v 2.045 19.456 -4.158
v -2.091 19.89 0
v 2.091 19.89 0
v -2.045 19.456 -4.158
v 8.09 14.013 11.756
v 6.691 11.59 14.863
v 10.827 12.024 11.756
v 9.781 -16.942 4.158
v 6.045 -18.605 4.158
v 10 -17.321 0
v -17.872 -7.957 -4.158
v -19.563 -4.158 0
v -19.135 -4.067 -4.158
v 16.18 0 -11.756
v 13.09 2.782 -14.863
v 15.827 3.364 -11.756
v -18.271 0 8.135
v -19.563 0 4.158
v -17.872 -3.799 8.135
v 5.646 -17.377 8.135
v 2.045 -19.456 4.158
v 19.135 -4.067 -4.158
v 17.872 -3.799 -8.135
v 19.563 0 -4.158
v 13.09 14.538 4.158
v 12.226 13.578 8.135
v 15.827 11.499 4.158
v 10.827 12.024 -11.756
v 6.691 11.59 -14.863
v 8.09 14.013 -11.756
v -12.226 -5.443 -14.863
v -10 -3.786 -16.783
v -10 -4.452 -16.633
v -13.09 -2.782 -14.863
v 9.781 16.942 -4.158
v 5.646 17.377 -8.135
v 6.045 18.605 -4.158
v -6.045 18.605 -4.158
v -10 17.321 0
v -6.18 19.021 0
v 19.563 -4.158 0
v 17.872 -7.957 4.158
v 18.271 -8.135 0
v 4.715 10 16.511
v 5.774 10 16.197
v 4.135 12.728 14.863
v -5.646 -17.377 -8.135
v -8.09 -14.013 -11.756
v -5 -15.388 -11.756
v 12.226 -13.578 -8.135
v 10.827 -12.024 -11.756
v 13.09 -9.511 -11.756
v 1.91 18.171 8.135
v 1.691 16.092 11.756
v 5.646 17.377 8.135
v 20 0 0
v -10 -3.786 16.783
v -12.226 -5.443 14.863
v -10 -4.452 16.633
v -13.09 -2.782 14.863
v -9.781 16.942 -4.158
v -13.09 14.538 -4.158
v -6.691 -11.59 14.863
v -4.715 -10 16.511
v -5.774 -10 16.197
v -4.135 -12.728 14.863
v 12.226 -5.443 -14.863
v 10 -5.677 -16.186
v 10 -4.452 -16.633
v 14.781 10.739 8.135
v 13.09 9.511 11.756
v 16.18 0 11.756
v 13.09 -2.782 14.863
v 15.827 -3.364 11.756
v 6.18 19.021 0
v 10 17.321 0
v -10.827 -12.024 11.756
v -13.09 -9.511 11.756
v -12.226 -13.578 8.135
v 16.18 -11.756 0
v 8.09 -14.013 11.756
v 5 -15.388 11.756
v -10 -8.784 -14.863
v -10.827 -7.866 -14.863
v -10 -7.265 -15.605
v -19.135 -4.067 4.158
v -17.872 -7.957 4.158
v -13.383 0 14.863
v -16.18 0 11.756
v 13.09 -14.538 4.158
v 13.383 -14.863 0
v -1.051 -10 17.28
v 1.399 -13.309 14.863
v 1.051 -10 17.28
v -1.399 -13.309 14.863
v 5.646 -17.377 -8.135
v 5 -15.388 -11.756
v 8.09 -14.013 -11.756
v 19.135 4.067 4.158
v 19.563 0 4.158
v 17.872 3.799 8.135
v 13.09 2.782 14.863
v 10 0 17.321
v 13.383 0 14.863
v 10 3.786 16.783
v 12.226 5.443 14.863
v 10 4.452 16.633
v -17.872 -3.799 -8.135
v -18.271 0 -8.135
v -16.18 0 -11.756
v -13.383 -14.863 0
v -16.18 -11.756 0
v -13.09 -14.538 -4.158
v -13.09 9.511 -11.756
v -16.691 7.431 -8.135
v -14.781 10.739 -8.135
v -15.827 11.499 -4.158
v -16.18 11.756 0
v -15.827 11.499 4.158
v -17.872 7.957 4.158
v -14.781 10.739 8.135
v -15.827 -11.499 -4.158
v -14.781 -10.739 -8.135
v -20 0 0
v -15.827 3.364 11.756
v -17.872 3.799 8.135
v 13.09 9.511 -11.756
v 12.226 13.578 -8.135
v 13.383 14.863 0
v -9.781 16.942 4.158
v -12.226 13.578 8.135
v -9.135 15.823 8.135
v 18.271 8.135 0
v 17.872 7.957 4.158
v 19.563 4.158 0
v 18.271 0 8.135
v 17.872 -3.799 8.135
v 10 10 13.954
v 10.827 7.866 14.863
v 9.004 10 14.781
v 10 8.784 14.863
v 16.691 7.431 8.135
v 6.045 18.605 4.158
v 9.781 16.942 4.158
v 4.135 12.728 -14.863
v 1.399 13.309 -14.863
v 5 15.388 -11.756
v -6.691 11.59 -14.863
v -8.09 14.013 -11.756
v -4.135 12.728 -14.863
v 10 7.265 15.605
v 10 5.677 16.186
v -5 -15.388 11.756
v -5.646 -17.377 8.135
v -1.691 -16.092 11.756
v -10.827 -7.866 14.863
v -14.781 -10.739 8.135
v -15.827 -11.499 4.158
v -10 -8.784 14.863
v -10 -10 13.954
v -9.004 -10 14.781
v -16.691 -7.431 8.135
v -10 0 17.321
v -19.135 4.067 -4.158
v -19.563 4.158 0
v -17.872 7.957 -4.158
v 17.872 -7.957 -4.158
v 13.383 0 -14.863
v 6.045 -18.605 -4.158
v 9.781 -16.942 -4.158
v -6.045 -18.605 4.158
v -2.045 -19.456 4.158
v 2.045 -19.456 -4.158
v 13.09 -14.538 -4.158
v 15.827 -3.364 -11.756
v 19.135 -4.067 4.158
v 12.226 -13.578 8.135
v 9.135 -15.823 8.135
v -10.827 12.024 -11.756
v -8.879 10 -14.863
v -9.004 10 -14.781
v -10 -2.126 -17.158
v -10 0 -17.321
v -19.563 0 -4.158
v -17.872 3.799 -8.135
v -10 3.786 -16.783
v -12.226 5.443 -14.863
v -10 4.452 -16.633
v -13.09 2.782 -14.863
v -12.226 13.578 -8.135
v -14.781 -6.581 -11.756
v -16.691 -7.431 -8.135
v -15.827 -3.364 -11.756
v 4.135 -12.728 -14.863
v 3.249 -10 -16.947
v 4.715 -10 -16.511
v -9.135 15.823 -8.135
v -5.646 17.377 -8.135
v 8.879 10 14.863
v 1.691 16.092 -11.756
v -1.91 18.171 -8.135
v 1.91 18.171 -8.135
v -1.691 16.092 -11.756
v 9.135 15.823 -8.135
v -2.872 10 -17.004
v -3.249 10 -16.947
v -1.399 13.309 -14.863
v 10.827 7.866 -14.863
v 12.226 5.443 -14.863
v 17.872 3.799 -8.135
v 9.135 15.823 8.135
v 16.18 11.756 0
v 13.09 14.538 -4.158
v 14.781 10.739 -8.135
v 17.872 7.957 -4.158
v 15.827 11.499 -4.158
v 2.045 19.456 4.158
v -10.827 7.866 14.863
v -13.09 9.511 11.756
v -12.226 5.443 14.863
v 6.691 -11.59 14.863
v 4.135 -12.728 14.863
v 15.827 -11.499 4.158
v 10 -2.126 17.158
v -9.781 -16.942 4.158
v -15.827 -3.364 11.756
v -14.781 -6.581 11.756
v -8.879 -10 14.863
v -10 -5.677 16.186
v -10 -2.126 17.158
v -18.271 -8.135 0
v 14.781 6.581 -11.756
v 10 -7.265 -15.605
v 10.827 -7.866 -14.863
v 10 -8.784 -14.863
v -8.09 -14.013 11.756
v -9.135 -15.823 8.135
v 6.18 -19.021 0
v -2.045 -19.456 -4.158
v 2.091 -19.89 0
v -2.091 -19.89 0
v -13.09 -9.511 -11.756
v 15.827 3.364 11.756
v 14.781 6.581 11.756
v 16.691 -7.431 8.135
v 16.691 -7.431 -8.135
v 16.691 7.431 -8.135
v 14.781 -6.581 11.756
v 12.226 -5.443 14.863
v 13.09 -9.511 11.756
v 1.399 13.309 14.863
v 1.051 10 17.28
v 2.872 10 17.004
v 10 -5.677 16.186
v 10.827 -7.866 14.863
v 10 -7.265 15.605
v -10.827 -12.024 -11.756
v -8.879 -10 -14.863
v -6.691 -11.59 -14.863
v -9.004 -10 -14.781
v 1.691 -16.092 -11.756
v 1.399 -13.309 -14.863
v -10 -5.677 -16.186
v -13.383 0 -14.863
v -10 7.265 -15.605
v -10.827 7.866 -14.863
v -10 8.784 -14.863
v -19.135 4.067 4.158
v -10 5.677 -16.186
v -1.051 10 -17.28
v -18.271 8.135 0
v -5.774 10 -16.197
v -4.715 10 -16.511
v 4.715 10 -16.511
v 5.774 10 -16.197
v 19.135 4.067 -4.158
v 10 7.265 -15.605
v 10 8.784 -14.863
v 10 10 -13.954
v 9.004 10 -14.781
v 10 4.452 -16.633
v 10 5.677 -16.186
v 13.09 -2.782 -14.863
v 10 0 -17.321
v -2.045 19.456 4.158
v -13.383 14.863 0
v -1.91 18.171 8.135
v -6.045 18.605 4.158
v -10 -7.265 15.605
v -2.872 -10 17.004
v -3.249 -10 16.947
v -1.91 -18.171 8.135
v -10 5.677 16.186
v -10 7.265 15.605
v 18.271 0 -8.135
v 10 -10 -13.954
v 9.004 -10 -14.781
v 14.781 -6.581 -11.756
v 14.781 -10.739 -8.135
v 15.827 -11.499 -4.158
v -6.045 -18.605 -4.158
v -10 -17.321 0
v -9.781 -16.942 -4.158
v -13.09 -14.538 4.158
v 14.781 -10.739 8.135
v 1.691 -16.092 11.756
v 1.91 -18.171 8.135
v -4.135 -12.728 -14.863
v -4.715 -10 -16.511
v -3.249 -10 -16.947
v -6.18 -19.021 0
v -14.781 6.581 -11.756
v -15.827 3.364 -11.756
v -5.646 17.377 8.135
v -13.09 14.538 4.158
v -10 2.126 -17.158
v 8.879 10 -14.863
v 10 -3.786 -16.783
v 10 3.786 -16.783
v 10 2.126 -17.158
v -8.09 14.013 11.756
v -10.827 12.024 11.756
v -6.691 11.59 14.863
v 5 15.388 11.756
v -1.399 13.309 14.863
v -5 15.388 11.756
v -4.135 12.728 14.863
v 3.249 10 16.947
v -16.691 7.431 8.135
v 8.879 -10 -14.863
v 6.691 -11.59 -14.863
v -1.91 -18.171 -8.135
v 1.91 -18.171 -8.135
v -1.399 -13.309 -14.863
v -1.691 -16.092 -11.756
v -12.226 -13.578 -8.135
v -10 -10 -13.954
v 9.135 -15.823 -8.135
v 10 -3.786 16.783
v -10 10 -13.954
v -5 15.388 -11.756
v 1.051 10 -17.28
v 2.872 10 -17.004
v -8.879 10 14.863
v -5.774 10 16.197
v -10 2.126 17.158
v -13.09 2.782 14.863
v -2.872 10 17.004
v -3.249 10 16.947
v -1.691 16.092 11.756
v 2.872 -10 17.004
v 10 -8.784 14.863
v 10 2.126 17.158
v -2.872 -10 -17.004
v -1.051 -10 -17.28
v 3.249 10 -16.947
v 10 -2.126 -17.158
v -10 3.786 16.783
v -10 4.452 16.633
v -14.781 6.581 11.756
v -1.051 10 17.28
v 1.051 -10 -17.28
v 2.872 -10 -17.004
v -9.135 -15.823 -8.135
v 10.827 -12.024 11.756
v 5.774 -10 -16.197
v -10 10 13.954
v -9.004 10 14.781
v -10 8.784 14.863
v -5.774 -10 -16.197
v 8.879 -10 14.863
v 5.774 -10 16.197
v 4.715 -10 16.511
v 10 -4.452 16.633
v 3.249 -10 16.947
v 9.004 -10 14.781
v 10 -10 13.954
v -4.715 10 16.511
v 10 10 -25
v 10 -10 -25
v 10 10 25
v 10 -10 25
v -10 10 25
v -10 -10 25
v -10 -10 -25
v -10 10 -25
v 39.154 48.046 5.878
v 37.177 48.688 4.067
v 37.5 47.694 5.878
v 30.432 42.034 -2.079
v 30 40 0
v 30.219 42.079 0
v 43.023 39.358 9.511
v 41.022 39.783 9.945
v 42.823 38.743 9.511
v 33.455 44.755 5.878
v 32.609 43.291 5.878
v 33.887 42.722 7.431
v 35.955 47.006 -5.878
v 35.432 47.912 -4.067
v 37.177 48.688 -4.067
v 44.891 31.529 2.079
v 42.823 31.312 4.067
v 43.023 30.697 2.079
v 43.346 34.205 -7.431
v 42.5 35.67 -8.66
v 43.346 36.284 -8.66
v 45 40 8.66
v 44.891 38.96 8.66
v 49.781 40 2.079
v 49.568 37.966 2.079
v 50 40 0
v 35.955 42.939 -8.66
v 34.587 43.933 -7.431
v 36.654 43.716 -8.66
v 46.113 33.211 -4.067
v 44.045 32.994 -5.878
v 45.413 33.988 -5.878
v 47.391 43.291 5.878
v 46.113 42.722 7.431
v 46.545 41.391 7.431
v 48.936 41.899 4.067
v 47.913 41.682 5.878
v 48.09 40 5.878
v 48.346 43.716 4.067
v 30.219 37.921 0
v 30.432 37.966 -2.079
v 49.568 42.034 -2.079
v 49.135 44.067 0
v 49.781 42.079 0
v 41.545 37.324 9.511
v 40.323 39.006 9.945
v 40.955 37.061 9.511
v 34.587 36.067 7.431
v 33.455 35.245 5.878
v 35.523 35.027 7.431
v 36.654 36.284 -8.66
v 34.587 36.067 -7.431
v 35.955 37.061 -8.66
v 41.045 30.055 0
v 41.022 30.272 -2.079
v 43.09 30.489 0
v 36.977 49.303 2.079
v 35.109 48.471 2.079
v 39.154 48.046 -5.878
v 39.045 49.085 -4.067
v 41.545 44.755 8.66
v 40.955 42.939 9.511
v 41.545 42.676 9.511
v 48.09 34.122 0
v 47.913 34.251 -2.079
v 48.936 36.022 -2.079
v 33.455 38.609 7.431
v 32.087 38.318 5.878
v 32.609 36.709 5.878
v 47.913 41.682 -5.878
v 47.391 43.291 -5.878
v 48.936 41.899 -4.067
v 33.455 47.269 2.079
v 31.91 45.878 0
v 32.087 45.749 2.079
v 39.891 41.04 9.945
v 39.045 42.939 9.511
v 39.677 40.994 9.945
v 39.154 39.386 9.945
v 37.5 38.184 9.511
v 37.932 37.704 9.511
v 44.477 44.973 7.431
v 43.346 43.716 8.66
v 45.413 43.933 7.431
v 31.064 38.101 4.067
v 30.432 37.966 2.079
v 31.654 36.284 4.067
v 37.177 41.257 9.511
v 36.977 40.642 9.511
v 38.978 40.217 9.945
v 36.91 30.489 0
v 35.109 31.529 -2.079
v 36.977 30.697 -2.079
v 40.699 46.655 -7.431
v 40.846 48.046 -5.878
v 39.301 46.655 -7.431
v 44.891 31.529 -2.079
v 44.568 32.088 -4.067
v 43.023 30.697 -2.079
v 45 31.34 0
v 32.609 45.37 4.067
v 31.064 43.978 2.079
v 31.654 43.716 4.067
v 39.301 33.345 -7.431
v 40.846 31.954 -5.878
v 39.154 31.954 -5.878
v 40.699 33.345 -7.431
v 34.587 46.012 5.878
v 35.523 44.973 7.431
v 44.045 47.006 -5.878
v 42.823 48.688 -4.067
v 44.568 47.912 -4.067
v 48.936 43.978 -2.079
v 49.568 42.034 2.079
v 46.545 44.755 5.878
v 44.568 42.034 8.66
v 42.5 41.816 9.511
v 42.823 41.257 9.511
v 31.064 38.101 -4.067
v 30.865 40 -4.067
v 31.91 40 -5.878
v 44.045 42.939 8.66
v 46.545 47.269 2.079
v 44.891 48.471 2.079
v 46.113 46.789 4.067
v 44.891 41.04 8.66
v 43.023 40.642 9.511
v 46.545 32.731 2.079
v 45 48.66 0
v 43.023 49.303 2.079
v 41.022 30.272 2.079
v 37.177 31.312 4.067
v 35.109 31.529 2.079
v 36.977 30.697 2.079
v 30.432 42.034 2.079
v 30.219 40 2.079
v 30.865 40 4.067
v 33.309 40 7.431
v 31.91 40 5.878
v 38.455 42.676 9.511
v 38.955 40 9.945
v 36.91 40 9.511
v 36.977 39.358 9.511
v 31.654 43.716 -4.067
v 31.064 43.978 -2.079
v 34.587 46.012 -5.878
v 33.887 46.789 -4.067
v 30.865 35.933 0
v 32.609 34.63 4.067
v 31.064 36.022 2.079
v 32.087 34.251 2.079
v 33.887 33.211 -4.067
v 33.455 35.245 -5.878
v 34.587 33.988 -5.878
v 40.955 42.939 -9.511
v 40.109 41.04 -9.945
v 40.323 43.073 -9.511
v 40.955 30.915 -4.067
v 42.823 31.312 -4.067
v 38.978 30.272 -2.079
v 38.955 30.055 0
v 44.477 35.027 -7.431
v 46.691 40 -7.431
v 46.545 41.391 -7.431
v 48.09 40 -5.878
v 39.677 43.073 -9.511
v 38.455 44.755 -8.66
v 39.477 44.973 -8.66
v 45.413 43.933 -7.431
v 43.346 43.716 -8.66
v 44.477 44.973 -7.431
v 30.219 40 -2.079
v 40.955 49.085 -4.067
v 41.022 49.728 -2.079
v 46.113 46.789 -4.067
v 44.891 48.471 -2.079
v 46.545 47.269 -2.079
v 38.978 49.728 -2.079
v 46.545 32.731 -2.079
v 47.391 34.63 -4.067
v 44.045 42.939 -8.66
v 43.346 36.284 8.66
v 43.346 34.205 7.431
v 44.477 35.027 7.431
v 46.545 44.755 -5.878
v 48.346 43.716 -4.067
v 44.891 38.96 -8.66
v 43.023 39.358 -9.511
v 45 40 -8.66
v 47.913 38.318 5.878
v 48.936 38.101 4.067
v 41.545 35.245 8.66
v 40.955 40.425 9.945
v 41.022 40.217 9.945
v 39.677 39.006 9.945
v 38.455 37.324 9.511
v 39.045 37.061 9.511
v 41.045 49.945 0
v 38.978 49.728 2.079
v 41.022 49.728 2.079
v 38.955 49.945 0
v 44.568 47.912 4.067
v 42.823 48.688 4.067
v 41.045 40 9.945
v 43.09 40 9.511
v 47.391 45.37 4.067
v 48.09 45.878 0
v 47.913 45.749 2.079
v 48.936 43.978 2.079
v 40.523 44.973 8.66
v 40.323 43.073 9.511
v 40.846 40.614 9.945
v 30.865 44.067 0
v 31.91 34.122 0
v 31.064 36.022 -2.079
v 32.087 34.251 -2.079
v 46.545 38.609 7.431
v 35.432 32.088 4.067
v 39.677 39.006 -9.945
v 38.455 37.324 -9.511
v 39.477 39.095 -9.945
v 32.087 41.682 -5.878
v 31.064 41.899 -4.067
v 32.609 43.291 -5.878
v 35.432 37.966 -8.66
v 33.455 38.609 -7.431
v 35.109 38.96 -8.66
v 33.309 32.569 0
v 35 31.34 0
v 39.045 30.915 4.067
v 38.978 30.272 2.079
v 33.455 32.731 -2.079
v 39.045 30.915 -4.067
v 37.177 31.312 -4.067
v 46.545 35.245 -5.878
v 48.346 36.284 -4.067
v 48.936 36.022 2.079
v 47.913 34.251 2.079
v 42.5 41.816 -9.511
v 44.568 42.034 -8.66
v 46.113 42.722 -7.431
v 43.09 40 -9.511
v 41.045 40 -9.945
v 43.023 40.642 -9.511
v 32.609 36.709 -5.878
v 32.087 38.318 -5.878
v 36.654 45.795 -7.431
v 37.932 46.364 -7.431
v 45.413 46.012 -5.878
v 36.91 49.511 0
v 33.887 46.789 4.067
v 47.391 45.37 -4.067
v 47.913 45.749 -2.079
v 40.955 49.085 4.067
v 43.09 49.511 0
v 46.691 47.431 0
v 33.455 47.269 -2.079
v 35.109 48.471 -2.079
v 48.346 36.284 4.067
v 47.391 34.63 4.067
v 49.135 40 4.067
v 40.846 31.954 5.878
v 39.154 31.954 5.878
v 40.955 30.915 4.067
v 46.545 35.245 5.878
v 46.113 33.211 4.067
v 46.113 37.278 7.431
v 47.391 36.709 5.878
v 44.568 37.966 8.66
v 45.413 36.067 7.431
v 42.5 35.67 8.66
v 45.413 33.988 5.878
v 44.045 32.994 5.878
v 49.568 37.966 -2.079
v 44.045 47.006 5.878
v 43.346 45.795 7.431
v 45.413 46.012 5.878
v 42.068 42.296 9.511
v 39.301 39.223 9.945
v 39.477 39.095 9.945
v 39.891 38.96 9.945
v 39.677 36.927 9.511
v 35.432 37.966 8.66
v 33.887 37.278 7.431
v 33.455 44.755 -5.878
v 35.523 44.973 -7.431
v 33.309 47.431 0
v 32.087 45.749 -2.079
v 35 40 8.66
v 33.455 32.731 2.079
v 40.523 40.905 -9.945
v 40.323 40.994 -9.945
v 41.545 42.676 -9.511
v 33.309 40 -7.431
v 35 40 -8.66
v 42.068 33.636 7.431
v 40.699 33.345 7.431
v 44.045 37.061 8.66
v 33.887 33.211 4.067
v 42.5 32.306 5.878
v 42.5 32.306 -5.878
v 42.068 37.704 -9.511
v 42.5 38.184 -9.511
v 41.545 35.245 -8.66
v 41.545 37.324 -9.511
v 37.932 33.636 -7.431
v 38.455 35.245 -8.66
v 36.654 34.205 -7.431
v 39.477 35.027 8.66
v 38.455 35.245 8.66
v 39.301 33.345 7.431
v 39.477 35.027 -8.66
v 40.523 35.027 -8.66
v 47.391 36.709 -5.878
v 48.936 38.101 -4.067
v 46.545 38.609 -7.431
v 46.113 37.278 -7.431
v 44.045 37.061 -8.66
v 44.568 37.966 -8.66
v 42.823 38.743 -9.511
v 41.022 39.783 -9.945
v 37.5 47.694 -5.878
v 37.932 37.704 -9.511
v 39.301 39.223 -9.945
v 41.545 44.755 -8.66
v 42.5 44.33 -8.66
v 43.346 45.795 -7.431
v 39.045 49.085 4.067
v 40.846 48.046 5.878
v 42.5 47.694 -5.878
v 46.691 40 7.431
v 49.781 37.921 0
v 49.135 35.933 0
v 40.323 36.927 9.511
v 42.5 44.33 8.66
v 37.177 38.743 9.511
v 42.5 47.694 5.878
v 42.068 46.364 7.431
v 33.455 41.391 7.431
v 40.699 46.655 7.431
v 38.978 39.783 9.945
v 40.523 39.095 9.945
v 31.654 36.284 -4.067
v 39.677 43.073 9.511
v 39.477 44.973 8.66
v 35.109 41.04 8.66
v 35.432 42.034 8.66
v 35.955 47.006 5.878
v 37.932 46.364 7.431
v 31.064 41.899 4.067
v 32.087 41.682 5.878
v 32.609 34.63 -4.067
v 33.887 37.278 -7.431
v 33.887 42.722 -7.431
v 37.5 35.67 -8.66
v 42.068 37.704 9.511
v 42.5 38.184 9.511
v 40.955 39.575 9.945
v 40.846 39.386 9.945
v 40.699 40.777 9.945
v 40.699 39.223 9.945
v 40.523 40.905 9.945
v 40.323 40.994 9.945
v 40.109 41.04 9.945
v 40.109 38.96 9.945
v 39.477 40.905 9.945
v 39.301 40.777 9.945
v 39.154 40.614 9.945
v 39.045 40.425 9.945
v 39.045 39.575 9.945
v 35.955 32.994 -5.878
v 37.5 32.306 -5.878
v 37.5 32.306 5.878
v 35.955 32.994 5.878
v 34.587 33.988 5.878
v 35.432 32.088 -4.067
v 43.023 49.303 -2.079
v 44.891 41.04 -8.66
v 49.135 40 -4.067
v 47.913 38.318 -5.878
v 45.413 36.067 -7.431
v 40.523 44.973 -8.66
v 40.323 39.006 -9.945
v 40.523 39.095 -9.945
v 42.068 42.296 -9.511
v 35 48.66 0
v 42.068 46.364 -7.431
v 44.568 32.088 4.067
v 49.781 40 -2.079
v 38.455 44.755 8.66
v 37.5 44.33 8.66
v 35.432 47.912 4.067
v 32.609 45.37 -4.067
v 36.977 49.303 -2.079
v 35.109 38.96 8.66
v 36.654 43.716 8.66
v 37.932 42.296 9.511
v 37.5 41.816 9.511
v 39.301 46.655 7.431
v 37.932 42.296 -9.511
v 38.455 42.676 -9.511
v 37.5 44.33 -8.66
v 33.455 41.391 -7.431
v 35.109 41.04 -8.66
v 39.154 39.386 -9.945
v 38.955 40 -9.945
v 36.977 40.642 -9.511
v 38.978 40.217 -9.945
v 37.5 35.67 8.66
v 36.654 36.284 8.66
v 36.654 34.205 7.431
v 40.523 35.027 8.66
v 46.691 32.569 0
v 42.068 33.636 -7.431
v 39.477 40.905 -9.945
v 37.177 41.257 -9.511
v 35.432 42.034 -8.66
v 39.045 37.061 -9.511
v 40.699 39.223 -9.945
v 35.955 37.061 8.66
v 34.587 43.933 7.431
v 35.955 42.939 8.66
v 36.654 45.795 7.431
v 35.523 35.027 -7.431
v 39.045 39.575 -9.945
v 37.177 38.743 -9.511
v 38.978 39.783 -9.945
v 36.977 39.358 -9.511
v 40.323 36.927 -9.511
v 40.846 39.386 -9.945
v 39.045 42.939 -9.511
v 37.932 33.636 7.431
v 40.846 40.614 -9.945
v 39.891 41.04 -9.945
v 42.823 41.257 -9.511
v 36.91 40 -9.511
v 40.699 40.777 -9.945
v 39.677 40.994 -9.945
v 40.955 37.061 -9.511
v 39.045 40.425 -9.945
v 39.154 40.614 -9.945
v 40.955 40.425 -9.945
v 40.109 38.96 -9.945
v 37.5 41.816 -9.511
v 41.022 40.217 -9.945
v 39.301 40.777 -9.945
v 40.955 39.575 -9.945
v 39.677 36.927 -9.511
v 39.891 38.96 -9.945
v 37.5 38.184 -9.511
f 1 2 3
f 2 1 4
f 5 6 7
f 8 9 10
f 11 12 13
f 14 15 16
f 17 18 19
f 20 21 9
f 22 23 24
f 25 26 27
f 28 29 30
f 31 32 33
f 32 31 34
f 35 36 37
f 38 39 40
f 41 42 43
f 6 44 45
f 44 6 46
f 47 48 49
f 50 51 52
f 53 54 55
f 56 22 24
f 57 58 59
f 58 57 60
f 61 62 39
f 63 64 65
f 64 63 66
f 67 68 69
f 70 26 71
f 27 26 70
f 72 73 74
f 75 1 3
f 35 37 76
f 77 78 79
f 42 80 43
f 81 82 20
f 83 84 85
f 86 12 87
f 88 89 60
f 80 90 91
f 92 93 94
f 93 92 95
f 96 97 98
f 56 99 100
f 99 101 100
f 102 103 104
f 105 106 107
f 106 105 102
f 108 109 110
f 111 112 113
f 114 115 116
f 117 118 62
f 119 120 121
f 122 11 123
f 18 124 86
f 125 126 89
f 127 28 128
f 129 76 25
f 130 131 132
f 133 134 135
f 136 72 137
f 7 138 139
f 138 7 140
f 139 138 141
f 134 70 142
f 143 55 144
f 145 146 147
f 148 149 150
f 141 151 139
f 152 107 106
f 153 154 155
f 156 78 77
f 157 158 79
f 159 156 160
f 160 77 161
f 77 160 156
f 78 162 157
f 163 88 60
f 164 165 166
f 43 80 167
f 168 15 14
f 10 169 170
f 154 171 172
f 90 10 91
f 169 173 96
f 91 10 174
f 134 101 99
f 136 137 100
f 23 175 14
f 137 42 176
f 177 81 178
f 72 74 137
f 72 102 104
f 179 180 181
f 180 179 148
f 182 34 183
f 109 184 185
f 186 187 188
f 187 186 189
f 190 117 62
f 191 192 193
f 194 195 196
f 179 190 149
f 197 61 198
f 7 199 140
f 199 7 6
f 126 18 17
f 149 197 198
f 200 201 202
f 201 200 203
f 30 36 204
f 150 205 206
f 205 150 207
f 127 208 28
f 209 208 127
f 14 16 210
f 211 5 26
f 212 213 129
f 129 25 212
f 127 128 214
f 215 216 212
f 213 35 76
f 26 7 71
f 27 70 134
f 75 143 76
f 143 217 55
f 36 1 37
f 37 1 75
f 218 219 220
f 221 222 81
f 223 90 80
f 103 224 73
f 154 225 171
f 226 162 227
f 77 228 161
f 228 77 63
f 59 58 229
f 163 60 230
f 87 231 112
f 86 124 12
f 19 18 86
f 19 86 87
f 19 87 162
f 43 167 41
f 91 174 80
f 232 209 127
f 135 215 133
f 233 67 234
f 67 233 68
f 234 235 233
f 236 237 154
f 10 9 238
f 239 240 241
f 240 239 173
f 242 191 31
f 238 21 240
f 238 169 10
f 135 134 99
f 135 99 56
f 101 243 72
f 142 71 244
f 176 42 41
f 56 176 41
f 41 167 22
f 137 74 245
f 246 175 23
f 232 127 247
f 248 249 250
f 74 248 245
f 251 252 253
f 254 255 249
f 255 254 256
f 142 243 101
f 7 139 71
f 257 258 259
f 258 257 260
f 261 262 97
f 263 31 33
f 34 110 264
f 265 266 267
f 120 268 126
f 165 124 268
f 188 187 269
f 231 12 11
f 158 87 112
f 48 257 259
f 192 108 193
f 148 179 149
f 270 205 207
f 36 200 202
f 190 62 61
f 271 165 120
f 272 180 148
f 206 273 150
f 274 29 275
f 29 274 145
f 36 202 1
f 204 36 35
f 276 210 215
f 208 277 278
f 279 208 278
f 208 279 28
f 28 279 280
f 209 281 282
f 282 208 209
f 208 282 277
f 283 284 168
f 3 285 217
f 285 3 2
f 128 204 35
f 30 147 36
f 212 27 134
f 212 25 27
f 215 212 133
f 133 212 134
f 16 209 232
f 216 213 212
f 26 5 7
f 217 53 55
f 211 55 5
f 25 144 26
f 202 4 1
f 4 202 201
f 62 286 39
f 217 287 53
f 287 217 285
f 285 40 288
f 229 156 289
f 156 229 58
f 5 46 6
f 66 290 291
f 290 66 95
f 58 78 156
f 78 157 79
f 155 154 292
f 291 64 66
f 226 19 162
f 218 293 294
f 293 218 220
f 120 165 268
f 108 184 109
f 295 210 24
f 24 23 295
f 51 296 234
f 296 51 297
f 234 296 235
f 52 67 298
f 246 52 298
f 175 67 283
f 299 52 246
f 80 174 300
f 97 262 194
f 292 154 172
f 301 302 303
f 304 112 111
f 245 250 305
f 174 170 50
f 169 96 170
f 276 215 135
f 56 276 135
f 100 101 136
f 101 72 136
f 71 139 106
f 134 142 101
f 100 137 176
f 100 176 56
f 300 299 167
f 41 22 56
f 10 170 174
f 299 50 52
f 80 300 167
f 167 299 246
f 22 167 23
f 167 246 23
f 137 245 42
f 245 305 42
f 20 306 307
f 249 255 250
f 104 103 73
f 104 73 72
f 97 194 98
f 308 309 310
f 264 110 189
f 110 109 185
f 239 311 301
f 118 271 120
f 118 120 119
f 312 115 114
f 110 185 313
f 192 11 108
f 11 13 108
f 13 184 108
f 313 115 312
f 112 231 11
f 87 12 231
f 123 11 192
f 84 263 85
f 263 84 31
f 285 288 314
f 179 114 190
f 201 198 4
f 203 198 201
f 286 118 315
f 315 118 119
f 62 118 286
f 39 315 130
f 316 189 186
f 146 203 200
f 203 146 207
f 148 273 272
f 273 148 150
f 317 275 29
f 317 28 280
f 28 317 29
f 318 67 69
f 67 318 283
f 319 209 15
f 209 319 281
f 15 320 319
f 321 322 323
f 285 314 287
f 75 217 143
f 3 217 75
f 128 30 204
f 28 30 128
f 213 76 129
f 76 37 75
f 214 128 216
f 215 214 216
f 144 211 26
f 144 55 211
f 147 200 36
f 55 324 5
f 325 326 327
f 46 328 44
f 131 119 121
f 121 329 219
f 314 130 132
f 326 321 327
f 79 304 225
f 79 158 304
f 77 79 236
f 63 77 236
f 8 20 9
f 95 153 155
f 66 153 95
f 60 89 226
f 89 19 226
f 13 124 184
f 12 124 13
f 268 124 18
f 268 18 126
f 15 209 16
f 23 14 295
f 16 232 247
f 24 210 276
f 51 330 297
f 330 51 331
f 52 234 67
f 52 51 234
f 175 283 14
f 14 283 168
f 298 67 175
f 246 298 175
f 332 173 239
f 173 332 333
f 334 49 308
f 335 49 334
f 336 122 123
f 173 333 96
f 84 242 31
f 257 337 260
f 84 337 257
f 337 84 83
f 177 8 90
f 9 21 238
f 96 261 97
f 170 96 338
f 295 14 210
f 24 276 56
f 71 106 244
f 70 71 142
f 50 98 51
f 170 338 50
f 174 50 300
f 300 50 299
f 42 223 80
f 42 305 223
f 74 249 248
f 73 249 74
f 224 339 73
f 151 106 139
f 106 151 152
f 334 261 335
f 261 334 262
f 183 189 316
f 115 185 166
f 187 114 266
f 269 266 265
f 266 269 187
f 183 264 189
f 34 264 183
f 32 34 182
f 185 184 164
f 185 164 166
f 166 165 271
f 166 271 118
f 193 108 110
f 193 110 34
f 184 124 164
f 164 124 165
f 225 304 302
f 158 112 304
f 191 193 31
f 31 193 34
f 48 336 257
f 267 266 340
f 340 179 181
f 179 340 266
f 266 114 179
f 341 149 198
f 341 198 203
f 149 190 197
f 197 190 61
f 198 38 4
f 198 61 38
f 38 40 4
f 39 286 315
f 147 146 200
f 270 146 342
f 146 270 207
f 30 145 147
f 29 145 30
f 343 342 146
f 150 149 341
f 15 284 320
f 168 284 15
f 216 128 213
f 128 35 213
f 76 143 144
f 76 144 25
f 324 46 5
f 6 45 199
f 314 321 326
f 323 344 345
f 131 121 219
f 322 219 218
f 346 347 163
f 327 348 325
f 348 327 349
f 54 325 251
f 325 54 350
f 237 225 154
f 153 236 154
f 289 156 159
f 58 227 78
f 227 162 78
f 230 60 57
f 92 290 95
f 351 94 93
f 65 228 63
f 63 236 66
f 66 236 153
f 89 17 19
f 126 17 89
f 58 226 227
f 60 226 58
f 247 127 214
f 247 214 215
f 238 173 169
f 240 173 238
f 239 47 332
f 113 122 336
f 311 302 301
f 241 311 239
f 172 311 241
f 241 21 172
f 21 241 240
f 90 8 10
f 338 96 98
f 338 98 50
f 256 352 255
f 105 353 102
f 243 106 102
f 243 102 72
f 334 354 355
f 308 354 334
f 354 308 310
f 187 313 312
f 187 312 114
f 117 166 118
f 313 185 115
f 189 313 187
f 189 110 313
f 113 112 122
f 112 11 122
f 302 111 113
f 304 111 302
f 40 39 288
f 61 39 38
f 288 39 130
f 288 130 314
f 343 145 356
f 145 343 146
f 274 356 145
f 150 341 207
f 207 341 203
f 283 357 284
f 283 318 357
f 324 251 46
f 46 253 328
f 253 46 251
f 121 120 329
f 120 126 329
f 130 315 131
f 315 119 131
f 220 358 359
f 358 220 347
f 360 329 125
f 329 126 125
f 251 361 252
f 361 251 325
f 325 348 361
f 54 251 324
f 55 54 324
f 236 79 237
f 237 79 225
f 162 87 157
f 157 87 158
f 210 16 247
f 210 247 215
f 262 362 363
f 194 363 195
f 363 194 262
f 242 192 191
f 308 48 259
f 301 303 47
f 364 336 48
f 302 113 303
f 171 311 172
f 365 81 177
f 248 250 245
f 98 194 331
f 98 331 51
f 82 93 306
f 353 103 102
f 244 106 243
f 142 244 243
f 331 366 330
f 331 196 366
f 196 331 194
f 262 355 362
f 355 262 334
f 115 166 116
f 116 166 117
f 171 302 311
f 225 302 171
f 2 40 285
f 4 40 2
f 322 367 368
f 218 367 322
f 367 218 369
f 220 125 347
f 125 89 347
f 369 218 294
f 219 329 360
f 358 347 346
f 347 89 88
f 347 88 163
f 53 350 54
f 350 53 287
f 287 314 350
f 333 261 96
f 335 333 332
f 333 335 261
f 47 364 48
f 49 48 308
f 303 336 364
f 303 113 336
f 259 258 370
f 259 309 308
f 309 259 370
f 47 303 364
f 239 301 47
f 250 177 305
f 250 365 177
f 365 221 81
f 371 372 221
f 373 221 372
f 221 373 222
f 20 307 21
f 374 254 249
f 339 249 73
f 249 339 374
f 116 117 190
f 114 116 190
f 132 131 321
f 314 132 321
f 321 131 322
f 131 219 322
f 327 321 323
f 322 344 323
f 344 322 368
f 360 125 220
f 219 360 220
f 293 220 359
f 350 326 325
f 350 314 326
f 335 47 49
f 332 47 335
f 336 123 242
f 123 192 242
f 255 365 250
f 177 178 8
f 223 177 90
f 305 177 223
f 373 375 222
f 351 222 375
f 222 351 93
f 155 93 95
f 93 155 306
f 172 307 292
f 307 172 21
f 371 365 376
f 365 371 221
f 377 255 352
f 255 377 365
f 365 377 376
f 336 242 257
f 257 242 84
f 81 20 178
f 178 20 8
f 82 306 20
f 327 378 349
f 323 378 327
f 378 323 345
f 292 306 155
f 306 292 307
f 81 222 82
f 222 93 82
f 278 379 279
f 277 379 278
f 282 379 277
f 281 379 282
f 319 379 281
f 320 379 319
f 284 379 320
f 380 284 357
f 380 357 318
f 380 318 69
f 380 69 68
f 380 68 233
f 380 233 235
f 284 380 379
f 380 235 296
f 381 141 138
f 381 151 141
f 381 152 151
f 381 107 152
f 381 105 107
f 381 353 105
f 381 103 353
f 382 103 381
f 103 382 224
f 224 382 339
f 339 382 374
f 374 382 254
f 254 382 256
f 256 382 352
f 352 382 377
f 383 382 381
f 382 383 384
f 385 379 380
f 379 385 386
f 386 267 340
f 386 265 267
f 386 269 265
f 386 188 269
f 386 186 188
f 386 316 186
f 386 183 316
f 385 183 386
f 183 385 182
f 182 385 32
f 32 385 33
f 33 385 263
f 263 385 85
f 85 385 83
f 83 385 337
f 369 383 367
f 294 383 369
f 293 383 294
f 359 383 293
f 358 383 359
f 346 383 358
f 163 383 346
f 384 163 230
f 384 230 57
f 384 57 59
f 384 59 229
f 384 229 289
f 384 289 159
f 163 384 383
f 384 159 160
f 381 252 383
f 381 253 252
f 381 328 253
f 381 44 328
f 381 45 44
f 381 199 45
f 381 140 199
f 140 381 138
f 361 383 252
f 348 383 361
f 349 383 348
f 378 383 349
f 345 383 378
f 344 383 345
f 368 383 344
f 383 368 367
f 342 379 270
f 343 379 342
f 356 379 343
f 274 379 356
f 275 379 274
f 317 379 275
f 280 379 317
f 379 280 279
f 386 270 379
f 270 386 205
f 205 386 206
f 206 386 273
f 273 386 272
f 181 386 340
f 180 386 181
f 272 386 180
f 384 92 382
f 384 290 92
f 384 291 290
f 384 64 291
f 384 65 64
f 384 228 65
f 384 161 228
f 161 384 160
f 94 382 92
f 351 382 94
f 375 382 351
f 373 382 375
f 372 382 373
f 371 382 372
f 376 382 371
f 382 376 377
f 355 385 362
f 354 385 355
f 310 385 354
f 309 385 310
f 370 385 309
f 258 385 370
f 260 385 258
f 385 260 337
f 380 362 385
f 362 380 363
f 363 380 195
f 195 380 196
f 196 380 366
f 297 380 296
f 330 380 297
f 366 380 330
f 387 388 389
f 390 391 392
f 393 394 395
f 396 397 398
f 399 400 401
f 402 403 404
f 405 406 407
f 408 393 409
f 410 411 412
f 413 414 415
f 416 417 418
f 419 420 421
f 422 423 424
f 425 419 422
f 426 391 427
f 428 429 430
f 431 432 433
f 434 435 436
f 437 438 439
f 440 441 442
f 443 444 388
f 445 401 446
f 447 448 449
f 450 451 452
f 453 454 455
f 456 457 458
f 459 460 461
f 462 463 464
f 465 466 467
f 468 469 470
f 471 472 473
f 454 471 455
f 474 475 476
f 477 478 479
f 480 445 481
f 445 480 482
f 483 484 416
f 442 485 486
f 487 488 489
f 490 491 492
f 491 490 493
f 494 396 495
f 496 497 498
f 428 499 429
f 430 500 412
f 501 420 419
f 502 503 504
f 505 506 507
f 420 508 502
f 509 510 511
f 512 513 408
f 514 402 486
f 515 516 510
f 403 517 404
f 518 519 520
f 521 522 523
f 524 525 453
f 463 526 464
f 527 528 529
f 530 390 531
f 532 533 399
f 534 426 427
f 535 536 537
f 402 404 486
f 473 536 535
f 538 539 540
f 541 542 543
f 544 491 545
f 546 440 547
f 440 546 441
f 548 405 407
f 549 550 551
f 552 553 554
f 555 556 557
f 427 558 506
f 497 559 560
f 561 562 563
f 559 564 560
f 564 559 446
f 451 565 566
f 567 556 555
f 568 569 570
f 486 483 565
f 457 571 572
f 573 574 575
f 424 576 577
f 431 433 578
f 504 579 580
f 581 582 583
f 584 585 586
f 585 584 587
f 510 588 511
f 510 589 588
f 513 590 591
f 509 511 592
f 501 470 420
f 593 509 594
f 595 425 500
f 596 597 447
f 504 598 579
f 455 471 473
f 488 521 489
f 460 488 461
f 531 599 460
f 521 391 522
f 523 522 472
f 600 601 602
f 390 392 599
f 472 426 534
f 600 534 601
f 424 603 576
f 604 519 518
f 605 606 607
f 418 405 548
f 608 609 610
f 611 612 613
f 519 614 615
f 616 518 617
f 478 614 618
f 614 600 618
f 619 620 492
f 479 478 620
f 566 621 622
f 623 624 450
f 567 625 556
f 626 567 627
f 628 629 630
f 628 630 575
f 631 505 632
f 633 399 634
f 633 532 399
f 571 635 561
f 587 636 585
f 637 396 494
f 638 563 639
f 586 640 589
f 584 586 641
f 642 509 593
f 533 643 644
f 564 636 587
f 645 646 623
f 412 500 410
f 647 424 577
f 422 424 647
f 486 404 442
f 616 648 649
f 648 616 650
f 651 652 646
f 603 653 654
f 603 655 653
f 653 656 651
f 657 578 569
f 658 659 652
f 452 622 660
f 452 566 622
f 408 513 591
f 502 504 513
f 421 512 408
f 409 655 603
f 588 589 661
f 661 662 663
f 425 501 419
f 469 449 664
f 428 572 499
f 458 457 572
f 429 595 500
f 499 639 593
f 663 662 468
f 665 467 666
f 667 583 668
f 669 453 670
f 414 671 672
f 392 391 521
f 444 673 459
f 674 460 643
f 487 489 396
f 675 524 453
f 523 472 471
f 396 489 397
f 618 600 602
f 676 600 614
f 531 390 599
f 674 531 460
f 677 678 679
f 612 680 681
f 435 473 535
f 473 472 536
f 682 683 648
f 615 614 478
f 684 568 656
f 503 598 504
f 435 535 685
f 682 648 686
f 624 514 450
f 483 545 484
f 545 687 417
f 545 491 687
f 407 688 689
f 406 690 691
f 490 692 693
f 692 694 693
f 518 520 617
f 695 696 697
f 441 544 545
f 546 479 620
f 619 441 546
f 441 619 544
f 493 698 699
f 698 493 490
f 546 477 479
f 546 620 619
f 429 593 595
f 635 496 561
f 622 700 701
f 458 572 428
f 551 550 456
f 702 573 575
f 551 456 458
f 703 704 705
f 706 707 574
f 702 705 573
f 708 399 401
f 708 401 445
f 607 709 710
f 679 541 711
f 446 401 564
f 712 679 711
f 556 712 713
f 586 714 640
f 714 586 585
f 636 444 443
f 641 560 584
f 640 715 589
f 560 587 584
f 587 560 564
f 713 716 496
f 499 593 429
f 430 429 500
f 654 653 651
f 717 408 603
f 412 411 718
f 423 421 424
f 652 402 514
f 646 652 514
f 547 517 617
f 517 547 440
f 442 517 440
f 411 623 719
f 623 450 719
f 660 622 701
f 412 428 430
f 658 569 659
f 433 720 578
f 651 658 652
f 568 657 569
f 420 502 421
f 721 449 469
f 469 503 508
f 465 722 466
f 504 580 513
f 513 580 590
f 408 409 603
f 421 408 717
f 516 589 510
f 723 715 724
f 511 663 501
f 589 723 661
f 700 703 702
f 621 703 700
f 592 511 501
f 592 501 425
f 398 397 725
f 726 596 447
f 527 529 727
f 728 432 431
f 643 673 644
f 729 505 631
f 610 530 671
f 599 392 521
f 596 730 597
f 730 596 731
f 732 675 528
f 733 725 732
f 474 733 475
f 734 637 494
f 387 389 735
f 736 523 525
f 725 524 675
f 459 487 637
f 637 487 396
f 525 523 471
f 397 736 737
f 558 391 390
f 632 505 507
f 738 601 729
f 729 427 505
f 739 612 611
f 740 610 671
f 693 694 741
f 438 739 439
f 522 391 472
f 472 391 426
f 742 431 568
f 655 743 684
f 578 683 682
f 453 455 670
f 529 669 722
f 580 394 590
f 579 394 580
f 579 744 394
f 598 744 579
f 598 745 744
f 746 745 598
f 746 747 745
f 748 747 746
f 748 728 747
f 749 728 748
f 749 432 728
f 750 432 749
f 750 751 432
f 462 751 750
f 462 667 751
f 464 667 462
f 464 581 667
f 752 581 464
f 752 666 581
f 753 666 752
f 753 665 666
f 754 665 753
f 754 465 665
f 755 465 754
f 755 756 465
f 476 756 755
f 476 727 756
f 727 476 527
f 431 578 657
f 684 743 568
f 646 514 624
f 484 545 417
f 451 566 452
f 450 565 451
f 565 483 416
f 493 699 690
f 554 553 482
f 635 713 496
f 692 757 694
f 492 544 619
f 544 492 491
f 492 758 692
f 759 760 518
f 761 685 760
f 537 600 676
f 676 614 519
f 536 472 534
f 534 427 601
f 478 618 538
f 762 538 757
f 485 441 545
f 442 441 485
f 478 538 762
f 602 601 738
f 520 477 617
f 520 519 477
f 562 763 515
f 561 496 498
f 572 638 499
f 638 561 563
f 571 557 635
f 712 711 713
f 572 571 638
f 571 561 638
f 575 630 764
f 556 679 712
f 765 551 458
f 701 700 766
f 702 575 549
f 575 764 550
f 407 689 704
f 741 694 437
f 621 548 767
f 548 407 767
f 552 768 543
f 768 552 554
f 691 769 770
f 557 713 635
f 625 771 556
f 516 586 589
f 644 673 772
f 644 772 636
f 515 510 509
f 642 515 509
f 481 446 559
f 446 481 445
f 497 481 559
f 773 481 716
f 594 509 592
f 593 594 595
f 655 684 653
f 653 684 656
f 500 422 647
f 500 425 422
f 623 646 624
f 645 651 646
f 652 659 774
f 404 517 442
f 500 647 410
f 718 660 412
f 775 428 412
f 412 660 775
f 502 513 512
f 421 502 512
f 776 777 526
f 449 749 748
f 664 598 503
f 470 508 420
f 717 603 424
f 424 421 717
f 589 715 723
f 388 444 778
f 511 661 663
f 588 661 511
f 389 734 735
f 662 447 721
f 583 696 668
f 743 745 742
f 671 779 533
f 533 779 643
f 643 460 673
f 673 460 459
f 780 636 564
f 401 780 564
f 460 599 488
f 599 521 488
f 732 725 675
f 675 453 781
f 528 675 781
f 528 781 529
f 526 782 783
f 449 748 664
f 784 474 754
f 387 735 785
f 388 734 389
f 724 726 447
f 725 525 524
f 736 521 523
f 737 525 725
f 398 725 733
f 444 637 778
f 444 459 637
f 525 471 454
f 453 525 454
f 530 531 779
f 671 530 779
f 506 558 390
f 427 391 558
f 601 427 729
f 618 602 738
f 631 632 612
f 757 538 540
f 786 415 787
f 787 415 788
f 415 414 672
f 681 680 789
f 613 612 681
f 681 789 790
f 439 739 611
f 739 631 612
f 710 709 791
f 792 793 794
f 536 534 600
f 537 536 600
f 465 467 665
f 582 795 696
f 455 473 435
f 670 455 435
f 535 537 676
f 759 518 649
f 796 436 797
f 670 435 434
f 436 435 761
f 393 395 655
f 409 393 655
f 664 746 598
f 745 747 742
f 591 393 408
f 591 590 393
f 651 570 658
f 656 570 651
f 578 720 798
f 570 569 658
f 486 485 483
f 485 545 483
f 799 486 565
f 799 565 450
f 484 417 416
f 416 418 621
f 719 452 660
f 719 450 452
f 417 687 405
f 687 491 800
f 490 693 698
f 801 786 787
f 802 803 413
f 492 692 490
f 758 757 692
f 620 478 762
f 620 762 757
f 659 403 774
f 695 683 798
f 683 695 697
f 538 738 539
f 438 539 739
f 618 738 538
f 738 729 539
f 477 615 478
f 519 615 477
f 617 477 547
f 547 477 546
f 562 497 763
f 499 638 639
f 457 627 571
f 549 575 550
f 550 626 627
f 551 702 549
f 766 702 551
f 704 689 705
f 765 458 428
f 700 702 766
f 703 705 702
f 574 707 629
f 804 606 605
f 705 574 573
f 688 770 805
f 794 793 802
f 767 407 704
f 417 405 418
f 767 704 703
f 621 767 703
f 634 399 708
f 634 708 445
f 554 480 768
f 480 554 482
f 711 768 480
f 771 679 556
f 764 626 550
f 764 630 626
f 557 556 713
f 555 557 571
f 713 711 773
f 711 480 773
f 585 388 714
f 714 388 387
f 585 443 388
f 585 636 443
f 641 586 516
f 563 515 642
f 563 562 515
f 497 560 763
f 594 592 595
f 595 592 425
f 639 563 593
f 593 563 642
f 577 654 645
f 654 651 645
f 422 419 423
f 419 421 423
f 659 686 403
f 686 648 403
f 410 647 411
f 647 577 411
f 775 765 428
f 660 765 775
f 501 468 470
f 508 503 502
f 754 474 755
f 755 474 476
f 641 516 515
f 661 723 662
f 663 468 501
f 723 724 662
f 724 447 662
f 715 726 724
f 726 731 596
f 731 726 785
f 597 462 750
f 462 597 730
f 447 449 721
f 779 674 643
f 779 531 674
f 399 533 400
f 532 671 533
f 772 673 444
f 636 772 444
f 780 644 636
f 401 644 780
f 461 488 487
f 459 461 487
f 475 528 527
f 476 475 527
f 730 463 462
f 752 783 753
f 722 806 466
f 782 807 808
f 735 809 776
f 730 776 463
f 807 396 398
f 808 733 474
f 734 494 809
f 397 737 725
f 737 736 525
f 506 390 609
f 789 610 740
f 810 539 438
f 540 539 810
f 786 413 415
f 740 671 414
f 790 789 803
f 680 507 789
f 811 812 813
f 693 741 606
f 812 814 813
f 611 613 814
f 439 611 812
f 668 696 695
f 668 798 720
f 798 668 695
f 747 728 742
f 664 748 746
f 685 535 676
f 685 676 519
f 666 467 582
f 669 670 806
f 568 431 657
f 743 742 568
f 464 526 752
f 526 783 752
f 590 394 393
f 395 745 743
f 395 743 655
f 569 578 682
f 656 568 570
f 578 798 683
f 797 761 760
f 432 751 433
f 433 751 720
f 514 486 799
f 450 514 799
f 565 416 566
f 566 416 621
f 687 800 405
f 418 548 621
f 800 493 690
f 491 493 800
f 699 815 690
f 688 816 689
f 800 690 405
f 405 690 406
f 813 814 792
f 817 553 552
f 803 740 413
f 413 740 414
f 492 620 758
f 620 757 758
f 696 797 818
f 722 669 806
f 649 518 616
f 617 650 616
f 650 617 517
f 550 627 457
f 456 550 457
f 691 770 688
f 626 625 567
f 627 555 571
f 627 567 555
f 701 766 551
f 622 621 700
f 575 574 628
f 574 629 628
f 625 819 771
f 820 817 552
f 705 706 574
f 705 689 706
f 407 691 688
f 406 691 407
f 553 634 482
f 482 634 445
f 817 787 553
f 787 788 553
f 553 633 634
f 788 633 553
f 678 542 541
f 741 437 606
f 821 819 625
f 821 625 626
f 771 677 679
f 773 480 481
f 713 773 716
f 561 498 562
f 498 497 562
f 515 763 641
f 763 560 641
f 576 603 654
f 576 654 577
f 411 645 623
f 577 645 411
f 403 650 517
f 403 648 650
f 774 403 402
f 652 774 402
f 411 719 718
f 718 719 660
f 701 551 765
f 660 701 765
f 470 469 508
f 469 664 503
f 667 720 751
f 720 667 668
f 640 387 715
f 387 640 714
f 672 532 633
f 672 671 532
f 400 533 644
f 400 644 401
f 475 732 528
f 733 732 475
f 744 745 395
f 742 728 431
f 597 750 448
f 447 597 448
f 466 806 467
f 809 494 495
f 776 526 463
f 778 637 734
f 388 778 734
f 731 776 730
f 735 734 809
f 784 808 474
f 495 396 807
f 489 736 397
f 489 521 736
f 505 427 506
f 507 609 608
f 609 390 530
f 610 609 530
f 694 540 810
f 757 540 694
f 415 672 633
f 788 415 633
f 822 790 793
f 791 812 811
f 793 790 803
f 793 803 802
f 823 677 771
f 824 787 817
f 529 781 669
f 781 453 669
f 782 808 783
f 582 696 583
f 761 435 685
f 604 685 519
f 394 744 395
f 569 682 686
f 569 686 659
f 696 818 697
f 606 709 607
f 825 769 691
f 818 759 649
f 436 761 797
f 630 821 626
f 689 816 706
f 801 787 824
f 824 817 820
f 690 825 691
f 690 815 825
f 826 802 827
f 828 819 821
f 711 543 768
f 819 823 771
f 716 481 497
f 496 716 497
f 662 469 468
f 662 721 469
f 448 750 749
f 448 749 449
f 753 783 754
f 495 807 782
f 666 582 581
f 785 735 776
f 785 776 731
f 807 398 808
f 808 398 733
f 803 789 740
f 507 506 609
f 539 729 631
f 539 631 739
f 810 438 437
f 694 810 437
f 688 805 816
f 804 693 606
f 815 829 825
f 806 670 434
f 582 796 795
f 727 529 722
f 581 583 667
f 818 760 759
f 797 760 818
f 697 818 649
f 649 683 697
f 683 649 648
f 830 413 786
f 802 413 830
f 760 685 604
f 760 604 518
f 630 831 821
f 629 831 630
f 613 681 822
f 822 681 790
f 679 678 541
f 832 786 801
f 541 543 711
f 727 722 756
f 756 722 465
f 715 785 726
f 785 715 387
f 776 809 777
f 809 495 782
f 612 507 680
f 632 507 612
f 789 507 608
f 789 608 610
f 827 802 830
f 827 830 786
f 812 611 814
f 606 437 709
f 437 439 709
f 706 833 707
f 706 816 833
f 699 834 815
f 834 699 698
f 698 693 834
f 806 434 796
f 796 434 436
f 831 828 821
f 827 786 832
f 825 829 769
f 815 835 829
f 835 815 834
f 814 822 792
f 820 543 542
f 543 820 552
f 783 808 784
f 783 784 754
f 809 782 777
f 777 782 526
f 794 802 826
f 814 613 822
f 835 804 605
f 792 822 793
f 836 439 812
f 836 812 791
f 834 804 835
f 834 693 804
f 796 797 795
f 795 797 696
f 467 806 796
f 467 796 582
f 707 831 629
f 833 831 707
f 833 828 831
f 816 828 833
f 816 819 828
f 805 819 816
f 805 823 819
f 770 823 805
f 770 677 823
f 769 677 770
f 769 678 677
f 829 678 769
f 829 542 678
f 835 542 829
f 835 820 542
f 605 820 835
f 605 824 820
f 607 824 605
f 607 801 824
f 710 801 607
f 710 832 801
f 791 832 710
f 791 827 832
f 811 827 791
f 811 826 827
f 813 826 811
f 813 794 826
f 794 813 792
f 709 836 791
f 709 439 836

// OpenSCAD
// We'll start with a comment

/* and another multiline

comment */

foo= 1+1;
bar = 1+3.14;
echo(bar);
//echo(0.1 + 0.1 + 0.1 - 0.3);
echo([1,2,3]);
echo([]);
echo(1+2, 32, foo=2, bar="biz");

//Interesting to note that you can happily apply
// operators to a function...
union()echo("foo");
sphere(r=20);

cube([20,20,50],center=true);

union()sphere(r=2);
union(){
    foo = 13;
    echo(foo=foo);
    sphere(r=2);
    sphere(r=3);
}

translate([40,40])sphere(r=10);

function func0(r1,r2,foo="bar") = r1+r2;
echo(func0(1,2));
